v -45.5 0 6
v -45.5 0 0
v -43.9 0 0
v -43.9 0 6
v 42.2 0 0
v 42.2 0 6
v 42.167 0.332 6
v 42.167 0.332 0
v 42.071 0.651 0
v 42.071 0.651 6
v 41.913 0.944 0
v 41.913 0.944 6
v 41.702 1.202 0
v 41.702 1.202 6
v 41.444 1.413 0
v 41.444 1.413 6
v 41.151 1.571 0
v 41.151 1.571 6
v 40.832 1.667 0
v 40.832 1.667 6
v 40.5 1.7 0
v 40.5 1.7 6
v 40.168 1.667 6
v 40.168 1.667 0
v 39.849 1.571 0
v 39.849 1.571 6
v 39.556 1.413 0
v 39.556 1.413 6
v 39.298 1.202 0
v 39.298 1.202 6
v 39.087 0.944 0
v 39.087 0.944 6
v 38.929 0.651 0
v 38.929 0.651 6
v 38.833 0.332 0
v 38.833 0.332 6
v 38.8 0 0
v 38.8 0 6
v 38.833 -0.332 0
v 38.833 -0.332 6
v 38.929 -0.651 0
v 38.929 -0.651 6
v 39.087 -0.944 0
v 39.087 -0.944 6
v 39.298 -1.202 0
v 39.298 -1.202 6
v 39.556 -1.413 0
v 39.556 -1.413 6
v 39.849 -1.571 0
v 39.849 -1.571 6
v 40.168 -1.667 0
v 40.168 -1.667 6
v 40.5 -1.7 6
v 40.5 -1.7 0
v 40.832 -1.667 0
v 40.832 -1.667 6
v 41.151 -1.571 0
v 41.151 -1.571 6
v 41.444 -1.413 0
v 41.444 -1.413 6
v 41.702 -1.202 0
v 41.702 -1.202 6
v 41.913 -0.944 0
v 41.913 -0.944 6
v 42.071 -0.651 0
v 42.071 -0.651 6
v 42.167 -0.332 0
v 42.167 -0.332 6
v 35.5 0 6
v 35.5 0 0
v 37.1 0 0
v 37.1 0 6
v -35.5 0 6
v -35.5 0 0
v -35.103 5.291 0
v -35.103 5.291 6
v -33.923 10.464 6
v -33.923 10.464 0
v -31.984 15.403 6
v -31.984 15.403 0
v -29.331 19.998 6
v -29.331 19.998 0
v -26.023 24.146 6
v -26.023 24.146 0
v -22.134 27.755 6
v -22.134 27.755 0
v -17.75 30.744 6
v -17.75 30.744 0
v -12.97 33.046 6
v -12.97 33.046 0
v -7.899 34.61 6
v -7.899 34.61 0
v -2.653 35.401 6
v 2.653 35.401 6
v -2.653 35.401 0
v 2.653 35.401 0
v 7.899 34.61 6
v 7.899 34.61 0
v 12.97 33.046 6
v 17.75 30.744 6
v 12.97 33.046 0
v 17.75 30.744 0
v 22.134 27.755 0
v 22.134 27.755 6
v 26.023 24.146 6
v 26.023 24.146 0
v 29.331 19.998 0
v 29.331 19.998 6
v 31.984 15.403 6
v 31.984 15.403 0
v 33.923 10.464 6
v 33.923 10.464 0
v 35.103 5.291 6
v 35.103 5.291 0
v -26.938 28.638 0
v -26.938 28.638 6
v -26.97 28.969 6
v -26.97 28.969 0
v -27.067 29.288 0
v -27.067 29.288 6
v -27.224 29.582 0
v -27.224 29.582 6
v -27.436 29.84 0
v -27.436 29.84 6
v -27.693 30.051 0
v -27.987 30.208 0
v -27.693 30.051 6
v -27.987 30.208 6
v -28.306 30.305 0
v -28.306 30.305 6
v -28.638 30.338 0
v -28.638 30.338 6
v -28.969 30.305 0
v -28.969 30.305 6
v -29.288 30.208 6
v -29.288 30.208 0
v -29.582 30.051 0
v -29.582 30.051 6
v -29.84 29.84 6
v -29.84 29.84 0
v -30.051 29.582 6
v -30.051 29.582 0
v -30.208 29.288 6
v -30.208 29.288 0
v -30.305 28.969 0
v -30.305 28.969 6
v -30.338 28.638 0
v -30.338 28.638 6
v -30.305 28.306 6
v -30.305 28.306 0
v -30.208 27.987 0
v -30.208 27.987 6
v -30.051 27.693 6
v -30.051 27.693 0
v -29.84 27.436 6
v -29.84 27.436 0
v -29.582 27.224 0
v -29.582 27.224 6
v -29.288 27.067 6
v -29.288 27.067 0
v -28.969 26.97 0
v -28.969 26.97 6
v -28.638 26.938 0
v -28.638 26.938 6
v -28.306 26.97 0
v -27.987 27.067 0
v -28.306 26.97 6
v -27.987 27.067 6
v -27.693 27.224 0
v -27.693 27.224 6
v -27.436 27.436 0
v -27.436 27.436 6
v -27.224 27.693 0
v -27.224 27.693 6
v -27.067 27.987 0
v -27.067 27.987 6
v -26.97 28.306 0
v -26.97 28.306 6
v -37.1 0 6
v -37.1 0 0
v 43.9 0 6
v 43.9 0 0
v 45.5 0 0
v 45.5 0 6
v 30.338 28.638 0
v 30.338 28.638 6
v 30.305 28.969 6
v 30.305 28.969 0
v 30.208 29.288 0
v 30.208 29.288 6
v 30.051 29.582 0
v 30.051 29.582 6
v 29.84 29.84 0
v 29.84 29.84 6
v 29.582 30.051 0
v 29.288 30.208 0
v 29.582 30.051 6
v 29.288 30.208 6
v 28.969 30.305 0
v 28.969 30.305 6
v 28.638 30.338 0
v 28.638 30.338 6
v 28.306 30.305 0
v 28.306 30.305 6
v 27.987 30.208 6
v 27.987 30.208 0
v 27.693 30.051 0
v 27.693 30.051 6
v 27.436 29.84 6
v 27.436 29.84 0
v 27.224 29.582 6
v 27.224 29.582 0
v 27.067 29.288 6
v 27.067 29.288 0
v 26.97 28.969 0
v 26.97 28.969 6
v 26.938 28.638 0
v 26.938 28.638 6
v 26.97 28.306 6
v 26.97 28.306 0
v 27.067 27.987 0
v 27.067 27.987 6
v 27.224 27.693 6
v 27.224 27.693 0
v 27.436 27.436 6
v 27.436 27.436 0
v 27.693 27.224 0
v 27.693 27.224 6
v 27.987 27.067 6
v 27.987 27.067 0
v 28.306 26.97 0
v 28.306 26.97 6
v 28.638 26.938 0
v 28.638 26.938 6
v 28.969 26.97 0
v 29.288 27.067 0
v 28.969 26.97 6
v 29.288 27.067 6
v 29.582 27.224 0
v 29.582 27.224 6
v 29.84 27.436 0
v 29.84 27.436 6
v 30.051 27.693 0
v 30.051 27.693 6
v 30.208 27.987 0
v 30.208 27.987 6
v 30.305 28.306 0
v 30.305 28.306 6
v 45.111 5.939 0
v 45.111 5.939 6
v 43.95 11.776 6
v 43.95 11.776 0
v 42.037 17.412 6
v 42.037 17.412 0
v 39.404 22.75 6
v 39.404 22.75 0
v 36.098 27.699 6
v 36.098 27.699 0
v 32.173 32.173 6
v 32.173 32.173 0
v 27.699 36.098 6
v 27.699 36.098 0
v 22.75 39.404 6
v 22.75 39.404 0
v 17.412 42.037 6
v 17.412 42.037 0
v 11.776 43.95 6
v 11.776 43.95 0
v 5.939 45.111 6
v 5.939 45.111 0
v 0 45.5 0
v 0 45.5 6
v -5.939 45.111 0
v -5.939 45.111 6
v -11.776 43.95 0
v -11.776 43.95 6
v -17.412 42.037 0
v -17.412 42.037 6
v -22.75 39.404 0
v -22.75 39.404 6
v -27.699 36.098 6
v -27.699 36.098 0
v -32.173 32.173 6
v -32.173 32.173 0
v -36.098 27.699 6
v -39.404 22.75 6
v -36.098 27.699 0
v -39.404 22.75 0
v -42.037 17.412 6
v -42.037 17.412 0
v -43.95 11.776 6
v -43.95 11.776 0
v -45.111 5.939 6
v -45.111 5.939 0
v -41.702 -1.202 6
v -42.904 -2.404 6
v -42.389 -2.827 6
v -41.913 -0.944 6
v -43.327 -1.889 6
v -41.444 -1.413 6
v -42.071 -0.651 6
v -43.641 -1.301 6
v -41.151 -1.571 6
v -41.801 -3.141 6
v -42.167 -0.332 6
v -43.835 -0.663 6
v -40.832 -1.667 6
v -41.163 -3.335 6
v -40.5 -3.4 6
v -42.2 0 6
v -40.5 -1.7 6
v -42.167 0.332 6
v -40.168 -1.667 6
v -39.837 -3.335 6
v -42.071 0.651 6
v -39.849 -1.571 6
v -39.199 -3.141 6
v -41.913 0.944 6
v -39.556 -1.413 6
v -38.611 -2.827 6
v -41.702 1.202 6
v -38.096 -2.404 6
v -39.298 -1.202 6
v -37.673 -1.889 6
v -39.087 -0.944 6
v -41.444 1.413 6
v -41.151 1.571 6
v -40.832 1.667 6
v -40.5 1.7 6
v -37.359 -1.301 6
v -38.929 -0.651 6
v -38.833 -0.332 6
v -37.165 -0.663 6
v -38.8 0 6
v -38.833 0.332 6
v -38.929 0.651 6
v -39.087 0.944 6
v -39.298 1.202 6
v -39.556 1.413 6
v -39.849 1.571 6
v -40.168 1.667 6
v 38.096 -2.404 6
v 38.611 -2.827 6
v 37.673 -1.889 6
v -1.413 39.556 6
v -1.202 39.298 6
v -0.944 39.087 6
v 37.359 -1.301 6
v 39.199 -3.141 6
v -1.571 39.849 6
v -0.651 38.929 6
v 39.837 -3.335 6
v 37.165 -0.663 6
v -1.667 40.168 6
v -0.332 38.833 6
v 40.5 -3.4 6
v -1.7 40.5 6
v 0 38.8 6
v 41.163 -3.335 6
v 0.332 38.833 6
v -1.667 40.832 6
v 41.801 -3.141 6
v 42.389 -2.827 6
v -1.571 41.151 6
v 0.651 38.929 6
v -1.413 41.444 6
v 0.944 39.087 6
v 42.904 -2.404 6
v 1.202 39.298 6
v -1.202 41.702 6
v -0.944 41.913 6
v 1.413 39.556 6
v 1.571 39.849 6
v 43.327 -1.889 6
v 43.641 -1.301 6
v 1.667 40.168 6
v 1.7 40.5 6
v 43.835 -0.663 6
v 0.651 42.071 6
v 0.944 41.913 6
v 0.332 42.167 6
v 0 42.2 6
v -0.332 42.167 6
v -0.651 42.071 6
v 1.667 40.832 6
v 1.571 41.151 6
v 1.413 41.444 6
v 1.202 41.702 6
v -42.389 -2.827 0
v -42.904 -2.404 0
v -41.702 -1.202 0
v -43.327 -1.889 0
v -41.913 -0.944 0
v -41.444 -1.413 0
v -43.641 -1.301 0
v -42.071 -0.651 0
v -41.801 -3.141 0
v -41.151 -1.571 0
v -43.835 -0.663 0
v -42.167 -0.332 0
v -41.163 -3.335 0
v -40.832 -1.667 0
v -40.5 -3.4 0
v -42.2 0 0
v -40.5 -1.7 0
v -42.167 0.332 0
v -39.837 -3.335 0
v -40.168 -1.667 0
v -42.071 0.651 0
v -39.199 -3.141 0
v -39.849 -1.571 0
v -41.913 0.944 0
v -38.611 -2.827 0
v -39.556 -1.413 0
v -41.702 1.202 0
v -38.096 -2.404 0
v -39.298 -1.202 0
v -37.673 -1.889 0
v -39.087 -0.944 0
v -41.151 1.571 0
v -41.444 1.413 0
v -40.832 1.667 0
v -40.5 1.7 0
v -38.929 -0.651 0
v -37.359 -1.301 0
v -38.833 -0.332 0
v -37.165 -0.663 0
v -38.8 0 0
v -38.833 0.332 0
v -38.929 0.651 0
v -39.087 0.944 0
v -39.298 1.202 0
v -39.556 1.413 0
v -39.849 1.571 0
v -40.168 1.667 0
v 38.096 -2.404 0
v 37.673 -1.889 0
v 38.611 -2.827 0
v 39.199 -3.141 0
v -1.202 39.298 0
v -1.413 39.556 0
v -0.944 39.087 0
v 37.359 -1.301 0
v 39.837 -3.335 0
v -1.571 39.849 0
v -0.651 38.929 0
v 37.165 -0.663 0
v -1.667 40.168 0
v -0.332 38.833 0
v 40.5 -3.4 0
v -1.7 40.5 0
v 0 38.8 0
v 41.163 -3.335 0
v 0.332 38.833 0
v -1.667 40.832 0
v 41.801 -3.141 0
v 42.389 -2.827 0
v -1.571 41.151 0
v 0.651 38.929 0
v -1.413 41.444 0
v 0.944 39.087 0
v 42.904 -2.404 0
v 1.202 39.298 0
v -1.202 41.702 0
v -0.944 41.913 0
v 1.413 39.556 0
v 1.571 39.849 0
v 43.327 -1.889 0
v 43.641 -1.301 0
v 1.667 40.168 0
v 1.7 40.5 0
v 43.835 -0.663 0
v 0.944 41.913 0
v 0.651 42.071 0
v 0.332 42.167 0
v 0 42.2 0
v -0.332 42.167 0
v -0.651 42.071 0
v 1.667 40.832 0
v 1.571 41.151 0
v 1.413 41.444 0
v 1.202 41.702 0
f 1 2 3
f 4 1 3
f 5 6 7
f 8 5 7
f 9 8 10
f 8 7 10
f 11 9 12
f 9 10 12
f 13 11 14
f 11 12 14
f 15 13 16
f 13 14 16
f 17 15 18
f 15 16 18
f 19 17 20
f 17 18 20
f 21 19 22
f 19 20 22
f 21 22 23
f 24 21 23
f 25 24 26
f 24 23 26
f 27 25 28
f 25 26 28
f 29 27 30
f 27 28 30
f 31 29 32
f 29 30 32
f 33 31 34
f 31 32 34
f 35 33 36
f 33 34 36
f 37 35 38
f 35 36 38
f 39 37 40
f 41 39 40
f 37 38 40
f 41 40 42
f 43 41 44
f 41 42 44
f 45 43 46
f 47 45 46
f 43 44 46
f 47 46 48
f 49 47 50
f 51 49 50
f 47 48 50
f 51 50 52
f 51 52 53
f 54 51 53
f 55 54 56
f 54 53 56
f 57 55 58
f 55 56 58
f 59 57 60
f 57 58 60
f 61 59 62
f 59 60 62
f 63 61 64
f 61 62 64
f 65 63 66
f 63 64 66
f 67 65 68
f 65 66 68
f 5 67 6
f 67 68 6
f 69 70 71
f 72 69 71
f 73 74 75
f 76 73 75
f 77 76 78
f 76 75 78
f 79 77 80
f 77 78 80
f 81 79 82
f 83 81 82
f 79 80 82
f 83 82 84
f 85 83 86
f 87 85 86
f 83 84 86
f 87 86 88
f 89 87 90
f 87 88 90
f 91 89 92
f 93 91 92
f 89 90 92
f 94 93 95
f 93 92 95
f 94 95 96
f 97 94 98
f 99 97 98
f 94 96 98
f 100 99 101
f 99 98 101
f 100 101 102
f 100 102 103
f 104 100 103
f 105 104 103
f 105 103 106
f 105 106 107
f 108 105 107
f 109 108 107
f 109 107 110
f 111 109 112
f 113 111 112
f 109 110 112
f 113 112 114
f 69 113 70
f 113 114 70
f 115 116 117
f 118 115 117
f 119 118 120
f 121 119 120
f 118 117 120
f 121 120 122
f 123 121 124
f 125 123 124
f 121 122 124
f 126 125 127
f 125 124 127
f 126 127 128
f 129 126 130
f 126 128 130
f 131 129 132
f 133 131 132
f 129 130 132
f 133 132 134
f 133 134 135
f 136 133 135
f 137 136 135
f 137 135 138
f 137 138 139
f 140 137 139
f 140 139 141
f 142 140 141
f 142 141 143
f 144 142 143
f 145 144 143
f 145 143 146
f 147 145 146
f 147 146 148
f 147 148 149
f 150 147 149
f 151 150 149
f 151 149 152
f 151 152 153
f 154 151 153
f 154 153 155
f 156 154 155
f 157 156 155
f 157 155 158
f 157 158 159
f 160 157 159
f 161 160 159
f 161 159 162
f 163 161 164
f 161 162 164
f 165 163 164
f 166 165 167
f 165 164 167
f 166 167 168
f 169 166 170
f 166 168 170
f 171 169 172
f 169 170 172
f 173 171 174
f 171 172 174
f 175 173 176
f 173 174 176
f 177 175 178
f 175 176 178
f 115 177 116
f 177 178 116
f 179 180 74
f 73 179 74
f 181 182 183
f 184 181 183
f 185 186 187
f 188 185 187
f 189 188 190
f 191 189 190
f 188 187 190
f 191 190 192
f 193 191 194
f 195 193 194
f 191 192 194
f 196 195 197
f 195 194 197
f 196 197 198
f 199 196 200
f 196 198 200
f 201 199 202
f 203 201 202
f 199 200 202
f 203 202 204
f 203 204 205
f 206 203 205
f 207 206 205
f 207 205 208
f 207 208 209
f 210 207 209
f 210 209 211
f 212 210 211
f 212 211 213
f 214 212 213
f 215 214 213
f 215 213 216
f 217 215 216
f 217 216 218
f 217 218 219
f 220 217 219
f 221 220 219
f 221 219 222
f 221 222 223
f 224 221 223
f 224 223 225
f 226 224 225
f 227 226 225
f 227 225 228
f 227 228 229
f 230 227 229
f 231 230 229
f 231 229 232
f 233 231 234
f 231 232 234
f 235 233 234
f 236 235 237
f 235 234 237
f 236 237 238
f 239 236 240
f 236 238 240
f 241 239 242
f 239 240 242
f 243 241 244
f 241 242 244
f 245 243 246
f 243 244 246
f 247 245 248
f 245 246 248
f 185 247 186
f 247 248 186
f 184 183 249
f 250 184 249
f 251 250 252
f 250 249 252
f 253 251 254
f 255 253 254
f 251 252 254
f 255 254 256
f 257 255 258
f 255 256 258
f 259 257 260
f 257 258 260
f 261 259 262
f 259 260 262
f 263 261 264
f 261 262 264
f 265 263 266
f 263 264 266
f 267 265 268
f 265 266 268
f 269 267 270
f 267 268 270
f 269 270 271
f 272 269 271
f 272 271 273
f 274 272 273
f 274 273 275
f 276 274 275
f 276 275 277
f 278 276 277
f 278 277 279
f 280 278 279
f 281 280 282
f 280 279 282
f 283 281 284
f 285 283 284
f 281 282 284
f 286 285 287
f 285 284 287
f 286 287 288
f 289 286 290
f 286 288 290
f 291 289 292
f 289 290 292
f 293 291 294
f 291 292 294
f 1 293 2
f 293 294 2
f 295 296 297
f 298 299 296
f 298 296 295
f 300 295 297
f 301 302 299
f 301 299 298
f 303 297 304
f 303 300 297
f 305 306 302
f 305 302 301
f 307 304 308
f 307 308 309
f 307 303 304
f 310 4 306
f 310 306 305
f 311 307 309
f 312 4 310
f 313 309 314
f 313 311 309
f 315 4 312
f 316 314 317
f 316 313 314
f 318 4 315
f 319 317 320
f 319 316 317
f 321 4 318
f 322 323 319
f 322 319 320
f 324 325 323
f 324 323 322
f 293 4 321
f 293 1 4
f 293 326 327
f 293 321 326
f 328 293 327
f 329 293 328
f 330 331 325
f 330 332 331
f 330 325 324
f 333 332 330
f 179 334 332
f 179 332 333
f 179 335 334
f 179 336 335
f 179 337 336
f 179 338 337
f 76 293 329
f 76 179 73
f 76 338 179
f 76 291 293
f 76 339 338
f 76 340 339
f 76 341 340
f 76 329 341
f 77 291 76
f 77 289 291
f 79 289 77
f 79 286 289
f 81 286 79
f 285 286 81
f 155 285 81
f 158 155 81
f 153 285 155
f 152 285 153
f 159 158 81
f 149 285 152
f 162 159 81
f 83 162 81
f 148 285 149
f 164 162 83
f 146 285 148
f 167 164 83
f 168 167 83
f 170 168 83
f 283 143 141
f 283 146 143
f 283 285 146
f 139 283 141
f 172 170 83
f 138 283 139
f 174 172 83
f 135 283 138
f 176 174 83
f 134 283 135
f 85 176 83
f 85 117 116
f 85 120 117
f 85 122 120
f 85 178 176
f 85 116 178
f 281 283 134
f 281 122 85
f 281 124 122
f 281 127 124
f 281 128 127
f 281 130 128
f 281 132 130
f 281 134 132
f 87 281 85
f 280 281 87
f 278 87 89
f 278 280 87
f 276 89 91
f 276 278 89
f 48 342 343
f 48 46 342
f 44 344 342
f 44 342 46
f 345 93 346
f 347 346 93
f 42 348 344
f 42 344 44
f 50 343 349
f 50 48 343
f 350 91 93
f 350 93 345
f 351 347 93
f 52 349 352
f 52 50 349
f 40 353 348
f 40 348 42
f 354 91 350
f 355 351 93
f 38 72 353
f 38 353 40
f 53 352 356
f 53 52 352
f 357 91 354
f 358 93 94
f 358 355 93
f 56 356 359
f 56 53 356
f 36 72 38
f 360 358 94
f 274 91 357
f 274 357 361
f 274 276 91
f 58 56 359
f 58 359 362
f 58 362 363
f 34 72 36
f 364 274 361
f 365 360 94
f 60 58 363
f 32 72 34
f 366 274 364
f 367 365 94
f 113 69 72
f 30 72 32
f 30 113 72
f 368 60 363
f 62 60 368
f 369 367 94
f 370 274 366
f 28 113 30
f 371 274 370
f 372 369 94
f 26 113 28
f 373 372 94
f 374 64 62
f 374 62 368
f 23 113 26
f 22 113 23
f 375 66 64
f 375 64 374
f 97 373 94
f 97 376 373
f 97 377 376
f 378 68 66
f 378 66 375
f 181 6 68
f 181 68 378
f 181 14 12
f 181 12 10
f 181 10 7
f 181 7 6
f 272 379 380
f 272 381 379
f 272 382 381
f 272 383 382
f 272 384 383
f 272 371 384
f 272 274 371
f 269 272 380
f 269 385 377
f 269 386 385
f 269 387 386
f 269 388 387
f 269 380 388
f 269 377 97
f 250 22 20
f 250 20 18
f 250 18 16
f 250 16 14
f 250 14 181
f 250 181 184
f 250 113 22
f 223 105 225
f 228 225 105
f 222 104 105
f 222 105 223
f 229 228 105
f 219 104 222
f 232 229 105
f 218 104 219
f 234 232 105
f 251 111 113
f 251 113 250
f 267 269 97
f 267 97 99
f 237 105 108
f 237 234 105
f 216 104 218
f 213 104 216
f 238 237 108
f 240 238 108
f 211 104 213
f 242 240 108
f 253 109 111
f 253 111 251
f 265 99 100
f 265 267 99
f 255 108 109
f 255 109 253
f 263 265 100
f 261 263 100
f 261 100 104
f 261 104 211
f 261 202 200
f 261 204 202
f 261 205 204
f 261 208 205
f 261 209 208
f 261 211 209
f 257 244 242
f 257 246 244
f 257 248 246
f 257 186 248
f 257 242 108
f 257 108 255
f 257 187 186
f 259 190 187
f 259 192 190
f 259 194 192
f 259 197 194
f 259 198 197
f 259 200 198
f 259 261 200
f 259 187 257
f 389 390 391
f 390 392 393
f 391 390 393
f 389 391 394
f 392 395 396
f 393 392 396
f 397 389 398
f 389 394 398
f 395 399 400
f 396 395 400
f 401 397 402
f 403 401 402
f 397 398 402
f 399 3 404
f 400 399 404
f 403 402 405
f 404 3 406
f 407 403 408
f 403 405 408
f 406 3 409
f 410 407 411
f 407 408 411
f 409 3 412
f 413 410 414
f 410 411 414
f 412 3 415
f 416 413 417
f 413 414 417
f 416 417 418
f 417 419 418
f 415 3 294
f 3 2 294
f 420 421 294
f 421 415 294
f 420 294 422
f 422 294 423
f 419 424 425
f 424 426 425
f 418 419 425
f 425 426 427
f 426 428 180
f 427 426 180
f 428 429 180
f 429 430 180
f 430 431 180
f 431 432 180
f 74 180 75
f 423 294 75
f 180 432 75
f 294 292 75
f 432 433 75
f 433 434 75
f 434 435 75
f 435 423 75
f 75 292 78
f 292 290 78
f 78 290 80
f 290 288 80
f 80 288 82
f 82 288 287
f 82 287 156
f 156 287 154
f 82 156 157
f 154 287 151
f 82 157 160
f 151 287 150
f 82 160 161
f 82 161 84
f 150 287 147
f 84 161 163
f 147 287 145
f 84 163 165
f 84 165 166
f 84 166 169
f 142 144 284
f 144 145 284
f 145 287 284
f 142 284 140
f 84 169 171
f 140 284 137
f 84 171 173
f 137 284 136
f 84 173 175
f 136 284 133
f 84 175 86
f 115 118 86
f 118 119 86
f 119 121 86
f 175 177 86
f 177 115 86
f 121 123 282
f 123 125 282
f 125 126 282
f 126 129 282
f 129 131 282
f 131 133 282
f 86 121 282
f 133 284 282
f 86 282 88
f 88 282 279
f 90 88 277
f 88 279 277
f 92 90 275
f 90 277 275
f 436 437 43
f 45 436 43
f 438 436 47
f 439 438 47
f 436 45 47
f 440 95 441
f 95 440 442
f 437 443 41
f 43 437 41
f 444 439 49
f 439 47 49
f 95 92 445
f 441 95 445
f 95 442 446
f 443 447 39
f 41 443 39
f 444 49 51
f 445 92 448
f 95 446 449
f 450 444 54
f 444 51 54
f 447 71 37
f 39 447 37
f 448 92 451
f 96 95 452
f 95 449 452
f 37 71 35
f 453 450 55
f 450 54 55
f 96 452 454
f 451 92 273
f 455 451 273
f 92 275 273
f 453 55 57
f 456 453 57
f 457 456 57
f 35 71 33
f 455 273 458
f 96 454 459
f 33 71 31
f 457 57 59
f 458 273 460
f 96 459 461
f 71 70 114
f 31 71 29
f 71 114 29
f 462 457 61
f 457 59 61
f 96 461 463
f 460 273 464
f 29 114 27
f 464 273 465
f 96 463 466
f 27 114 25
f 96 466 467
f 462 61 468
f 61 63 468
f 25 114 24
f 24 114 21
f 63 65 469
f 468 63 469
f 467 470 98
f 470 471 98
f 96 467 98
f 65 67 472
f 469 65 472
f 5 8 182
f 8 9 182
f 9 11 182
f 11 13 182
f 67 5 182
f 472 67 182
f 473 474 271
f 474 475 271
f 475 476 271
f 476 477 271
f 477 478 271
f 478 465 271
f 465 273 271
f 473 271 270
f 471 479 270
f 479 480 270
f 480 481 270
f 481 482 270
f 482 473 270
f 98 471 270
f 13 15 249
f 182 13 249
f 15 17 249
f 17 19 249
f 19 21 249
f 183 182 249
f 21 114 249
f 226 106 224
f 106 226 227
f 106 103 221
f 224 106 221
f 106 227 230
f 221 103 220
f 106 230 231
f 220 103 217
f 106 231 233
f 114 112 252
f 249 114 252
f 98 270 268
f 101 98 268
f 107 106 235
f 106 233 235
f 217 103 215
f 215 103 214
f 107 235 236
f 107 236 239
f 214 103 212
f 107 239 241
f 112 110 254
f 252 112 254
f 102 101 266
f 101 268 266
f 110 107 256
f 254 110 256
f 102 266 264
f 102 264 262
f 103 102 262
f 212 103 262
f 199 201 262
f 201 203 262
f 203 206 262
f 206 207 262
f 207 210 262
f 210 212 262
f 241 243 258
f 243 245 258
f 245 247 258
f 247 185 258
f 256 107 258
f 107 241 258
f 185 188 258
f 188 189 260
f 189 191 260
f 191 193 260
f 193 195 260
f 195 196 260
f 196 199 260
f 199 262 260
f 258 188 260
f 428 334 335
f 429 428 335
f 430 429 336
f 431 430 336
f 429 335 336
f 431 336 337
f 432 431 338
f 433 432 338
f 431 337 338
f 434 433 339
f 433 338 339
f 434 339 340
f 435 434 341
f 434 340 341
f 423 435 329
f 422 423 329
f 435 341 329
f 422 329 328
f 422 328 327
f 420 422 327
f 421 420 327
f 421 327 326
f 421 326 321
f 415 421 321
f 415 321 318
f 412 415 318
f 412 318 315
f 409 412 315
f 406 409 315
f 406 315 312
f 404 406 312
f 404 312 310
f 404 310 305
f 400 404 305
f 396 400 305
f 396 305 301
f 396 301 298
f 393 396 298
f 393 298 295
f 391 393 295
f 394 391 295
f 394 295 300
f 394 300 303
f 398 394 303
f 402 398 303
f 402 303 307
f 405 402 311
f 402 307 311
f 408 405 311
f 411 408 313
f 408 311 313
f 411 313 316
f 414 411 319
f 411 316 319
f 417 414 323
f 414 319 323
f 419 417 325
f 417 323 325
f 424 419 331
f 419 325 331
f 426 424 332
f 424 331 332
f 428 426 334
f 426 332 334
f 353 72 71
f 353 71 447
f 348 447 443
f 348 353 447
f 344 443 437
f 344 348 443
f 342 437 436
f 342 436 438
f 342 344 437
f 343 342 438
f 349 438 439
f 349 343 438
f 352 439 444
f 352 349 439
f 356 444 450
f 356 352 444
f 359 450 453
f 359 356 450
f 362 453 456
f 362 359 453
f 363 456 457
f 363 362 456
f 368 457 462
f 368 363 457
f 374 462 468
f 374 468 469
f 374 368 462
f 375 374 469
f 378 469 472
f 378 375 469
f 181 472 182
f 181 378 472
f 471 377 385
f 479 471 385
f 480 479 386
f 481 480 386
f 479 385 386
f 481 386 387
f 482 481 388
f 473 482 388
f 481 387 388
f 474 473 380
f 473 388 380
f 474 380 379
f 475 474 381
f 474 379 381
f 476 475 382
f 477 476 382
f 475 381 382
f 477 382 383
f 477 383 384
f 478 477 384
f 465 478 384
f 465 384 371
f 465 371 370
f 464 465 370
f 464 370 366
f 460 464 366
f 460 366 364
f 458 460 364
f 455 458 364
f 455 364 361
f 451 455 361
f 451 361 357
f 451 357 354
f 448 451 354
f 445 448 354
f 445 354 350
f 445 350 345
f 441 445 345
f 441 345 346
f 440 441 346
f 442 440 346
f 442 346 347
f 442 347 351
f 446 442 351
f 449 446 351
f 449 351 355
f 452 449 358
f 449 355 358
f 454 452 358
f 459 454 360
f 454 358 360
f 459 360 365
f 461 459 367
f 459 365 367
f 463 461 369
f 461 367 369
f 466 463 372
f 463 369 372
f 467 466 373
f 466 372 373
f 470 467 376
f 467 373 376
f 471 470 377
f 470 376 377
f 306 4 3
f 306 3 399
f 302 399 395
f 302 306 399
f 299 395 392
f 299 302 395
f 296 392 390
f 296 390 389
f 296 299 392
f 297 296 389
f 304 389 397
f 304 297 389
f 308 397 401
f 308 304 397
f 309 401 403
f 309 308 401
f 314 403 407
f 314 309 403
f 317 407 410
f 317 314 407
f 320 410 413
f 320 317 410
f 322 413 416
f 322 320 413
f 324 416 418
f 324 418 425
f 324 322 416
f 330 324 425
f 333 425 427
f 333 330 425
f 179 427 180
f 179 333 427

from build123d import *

# Parameters (mm, degrees)
SALIENTE_EXTRUIR1_DEPTH = 6
CROQUIS2_R              = 1.7
CORTAR_EXTRUIR1_DEPTH   = 7
CROQUIS3_R              = 3.4
CROQUIS3_R_2            = 1.7
SALIENTE_EXTRUIR2_DEPTH = 6


with BuildPart() as part:
    # Croquis1 → Saliente-Extruir1 (new body)
    with BuildSketch(Plane.XY):
        with BuildLine():
            Line((-45.5, 0), (-35.5, 0))
            ThreePointArc((-35.5, 0), (0, 35.5), (35.5, 0))
            Line((35.5, 0), (45.5, 0))
            ThreePointArc((45.5, 0), (0, 45.5), (-45.5, 0))
        make_face()
    extrude(amount=SALIENTE_EXTRUIR1_DEPTH)

    # Croquis2 → Cortar-Extruir1 (cut, through all)
    with BuildSketch(Plane.XY.offset(6)):
        with Locations((0, 40.5)):
            Circle(CROQUIS2_R)
        with Locations((28.637824638, 28.637824638)):
            Circle(CROQUIS2_R)
        with Locations((40.5, 0)):
            Circle(CROQUIS2_R)
        with Locations((-40.5, 0)):
            Circle(CROQUIS2_R)
        with Locations((-28.637824638, 28.637824638)):
            Circle(CROQUIS2_R)
    extrude(amount=-CORTAR_EXTRUIR1_DEPTH, mode=Mode.SUBTRACT)

    # Croquis3 → Saliente-Extruir2 (add)
    with BuildSketch(Plane.XY.offset(6)):
        with Locations((-40.5, 0)):
            Circle(CROQUIS3_R)
        with Locations((-40.5, 0)):
            Circle(CROQUIS3_R_2, mode=Mode.SUBTRACT)
        with Locations((40.5, 0)):
            Circle(CROQUIS3_R)
        with Locations((40.5, 0)):
            Circle(CROQUIS3_R_2, mode=Mode.SUBTRACT)
    extrude(amount=-SALIENTE_EXTRUIR2_DEPTH)


solid = part.part
